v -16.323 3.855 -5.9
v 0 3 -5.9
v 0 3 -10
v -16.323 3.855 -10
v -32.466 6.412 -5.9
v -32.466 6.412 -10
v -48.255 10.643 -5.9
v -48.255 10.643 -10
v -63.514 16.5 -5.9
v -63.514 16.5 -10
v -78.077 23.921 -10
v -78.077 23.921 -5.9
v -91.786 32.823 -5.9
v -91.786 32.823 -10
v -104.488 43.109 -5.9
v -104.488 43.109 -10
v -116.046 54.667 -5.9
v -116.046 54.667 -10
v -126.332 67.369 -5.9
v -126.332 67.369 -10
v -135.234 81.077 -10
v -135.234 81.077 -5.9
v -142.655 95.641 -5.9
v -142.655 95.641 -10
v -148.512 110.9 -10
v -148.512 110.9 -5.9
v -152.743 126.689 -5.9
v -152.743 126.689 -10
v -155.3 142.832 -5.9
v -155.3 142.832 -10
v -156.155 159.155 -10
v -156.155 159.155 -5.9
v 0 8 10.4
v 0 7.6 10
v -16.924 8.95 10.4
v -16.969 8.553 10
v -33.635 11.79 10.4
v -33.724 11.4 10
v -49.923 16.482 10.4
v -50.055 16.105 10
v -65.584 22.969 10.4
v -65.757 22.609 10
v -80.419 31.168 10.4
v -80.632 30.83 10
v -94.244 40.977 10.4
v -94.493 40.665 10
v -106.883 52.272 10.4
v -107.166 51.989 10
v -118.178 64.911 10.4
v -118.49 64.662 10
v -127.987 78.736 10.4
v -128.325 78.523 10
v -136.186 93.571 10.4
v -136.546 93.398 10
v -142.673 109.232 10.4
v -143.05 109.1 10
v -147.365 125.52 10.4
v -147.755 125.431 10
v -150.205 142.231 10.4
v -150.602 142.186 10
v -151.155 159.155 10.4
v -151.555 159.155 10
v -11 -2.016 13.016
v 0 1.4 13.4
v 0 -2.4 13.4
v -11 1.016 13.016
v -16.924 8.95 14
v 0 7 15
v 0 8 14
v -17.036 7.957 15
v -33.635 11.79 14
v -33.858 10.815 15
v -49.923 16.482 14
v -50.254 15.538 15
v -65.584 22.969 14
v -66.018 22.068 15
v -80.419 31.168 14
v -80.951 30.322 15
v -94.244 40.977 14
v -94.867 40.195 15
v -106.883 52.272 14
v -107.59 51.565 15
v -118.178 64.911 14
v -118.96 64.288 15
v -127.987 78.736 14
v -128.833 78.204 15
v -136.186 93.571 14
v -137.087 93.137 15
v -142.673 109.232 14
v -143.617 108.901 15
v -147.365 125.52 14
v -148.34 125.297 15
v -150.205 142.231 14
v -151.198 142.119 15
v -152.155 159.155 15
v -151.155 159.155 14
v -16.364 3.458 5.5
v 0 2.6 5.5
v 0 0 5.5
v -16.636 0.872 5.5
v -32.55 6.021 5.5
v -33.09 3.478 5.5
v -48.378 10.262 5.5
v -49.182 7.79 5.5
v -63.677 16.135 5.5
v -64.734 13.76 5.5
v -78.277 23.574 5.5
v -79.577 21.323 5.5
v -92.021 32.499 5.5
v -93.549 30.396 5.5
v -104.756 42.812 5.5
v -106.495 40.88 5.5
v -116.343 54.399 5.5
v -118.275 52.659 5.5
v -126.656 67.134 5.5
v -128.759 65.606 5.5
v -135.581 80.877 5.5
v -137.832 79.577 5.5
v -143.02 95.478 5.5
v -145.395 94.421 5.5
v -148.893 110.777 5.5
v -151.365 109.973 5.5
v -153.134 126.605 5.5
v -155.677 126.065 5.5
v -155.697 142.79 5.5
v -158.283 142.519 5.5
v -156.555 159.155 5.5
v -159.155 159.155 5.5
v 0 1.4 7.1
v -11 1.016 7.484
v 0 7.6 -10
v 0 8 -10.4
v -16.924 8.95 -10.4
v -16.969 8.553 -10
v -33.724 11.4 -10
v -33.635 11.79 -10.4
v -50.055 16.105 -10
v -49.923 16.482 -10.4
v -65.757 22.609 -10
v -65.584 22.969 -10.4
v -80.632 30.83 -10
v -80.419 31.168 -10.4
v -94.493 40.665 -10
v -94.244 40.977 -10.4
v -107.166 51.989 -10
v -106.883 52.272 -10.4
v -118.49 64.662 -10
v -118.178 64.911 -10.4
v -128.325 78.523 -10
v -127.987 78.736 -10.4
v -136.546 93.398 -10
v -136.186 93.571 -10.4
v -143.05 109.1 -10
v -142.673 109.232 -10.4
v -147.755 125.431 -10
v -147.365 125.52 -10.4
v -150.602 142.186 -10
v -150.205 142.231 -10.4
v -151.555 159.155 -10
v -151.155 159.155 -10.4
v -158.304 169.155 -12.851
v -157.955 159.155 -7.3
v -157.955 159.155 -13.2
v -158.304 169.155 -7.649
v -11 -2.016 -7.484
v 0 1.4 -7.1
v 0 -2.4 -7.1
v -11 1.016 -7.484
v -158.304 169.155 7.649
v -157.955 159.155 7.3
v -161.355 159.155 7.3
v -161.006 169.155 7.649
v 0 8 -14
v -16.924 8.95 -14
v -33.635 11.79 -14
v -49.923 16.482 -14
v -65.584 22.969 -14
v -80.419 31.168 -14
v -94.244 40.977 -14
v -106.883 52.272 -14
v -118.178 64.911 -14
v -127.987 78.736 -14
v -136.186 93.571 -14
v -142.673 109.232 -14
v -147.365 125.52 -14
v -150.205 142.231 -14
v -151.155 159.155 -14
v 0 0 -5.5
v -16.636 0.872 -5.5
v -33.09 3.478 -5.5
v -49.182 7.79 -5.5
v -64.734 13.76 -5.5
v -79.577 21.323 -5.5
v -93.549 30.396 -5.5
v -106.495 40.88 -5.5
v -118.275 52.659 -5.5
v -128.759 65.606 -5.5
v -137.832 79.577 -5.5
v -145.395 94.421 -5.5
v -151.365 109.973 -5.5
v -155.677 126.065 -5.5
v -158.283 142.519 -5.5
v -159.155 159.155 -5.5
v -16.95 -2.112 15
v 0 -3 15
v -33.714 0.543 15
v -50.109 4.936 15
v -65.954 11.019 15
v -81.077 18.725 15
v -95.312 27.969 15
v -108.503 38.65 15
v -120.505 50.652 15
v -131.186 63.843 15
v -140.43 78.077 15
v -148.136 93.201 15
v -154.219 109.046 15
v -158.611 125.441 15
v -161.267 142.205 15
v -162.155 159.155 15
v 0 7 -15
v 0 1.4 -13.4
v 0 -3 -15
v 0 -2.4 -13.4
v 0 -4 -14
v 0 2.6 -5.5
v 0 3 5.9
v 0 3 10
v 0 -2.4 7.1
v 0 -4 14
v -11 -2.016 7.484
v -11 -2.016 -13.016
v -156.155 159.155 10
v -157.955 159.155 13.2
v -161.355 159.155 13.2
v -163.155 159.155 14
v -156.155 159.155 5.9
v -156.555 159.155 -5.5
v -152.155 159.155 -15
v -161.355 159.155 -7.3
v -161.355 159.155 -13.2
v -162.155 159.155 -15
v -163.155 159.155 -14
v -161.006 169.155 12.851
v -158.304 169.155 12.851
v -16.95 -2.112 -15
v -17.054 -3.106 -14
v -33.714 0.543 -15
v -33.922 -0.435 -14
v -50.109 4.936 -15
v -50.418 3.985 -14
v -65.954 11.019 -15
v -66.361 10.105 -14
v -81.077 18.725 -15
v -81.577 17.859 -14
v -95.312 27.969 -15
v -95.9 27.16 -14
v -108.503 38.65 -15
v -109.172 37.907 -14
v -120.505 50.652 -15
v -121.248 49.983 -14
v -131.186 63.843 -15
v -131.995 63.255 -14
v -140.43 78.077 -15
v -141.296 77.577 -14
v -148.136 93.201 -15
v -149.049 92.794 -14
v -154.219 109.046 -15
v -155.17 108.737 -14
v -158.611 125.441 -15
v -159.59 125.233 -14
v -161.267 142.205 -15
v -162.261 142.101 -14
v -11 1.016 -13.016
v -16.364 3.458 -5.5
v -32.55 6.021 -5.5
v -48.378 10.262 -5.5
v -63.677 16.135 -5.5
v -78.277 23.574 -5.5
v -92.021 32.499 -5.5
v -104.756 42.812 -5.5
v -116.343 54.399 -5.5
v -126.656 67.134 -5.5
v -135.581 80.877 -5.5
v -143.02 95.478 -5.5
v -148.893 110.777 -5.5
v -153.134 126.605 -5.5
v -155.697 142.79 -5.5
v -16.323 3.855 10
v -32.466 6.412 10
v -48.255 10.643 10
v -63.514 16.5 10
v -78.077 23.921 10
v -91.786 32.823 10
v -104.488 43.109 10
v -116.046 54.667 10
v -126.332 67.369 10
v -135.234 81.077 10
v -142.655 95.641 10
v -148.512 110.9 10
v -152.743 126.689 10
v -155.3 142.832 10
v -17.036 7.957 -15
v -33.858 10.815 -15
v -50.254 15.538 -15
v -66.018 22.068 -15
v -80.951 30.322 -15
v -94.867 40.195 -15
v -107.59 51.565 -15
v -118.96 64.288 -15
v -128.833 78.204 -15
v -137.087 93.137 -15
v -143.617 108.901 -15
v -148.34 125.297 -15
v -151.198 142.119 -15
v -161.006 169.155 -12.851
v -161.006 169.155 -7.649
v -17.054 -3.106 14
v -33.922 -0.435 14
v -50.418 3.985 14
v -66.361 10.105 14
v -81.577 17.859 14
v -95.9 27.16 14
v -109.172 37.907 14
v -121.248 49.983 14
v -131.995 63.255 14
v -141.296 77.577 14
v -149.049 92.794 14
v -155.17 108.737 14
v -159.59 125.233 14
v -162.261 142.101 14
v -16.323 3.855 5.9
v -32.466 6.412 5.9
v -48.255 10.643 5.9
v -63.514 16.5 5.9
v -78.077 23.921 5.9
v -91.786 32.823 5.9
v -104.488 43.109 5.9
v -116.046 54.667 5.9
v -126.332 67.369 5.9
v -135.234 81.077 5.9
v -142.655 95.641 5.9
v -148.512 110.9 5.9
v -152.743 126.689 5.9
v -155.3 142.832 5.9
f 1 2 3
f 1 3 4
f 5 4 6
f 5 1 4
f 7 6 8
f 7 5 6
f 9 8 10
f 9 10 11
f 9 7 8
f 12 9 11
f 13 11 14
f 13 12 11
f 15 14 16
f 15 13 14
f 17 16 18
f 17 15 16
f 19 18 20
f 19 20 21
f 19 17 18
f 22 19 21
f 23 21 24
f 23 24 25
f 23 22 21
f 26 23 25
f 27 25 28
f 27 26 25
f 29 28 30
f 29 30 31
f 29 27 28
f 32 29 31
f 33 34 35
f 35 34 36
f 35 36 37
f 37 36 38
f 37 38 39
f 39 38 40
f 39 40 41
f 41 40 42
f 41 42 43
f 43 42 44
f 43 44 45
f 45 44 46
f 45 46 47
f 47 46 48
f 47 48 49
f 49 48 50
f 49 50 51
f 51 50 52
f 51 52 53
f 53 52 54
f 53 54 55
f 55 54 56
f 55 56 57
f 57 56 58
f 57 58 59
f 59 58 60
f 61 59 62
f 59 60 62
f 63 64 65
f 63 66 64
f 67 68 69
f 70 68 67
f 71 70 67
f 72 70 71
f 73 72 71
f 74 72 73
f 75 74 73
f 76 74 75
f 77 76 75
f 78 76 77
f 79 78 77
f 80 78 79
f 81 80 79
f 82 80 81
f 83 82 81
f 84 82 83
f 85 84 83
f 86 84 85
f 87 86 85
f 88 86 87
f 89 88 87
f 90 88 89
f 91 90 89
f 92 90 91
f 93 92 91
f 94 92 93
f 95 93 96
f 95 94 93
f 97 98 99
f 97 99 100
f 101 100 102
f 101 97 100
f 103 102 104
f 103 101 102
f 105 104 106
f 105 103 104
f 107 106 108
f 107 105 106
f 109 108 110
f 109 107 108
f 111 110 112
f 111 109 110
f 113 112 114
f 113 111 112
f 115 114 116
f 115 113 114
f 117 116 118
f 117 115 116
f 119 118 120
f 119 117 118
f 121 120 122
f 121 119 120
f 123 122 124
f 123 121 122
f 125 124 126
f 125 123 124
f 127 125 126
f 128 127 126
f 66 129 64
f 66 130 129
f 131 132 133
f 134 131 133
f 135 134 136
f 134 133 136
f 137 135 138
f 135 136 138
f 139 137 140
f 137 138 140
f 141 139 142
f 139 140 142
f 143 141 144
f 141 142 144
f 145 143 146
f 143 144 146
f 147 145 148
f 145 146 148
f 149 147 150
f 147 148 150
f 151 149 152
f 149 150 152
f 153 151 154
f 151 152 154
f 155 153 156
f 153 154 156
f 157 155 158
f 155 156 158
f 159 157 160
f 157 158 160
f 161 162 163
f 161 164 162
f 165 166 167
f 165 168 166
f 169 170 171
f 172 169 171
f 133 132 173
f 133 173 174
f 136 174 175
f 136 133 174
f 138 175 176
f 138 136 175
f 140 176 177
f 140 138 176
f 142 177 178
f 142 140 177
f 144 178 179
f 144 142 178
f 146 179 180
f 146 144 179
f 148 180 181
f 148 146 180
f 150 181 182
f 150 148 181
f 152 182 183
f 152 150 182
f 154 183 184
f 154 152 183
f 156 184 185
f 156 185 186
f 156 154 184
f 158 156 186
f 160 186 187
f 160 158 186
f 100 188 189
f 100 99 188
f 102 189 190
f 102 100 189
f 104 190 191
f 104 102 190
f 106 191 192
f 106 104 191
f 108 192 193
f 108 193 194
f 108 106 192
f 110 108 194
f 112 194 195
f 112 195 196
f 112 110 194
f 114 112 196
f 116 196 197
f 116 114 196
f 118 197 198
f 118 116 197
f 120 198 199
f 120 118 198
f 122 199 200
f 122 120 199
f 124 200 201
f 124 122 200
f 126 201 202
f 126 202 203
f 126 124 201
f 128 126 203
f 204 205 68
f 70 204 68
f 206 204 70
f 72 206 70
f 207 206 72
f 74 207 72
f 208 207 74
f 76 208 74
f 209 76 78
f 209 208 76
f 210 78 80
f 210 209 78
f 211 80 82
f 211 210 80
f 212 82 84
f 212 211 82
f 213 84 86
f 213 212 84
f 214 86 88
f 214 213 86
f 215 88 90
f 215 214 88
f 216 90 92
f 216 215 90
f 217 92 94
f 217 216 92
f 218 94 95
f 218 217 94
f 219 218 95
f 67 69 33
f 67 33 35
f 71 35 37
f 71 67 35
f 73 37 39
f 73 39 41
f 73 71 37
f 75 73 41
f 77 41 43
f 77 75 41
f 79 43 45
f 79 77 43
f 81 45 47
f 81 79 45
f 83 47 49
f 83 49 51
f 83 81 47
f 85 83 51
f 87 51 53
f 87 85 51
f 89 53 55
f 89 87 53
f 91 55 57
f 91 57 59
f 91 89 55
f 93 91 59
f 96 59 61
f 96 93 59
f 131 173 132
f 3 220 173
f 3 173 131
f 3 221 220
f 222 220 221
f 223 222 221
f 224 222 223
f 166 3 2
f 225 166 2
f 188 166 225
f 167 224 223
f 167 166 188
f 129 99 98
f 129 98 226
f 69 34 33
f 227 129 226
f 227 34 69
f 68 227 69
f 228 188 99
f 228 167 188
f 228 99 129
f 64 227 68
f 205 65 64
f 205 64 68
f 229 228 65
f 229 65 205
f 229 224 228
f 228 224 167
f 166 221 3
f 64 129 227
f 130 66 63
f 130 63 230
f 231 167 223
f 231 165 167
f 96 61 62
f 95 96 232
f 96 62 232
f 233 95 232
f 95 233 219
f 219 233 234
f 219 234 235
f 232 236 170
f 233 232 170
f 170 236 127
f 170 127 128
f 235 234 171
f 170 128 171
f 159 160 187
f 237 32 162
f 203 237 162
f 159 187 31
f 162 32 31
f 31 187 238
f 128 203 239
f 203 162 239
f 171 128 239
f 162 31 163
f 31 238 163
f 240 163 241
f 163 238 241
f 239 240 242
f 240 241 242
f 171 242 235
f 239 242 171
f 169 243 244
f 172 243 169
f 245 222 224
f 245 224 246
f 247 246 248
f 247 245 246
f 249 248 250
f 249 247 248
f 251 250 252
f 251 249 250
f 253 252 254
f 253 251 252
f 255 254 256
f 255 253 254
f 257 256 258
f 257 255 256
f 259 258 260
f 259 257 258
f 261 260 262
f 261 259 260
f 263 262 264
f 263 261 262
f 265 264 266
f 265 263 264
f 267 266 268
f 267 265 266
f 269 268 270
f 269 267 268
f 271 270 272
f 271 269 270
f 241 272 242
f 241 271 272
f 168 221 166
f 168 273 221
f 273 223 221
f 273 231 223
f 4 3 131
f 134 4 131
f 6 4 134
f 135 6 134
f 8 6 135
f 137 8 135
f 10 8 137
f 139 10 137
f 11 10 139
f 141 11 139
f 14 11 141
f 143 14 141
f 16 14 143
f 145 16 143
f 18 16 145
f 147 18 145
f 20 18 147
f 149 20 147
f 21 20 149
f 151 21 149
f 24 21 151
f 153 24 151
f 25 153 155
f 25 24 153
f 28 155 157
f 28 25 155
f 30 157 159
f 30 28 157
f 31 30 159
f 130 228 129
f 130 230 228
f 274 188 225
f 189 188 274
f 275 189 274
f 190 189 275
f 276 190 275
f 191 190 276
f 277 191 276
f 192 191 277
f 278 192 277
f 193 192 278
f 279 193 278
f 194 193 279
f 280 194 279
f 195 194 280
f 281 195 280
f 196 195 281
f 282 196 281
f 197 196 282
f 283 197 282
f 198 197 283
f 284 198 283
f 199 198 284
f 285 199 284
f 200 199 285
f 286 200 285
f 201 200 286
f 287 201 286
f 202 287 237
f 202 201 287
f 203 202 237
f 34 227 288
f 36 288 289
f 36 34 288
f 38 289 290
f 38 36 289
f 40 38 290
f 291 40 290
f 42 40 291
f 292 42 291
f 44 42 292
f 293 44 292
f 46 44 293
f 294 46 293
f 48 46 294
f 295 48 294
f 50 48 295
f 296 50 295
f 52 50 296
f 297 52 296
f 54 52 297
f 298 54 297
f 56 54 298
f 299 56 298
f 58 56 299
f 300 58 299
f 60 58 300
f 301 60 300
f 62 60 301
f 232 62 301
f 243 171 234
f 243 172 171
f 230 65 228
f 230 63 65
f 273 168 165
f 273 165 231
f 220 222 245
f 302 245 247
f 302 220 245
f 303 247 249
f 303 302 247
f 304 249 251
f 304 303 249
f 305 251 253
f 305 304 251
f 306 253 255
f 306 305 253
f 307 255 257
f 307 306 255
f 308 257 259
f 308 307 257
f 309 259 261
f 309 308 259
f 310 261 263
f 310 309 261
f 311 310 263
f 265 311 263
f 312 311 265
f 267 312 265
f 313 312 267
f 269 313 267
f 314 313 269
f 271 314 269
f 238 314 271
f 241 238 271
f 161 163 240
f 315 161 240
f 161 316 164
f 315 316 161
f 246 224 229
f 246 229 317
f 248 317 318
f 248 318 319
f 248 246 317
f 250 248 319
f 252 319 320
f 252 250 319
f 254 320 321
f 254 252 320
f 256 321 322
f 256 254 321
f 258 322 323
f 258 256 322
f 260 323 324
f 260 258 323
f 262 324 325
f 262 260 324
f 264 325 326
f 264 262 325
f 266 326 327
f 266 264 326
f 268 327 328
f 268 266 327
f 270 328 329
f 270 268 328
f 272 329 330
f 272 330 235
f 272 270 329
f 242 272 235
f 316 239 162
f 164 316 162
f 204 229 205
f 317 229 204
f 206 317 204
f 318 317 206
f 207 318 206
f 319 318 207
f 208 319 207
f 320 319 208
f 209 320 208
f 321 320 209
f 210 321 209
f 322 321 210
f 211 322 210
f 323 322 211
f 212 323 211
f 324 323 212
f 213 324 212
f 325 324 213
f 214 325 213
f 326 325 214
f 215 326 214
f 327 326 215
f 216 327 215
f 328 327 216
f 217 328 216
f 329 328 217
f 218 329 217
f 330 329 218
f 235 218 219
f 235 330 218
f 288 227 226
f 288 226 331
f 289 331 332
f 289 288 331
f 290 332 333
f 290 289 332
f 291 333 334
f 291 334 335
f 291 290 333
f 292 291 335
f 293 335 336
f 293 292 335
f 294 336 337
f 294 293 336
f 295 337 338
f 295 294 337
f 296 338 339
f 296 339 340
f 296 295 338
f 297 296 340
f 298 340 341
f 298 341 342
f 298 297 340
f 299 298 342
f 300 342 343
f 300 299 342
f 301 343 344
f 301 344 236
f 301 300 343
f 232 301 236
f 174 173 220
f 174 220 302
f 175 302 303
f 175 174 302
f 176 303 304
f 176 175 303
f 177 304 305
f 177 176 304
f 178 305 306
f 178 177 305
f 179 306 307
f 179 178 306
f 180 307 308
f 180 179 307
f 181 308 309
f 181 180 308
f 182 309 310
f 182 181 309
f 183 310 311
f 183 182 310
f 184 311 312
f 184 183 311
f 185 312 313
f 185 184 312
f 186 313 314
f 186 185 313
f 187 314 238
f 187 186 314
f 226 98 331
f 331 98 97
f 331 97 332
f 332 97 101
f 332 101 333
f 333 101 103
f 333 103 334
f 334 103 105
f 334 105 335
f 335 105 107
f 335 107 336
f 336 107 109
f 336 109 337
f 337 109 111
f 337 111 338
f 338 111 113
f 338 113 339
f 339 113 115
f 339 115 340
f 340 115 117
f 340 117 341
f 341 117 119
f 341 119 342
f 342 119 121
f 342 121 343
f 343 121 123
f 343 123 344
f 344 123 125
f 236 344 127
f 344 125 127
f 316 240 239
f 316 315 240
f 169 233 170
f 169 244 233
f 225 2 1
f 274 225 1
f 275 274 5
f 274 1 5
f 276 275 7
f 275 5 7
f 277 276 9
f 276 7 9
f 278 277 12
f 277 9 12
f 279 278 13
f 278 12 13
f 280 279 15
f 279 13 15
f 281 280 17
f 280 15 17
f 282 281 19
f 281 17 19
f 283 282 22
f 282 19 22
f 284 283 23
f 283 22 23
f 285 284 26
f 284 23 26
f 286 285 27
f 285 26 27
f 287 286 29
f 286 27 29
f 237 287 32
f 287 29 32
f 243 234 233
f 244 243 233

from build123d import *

# Parameters (mm, degrees)
CHANFREIN1_SIZE         = 1
CHANFREIN3_SIZE         = 0.4
ESQUISSE5_W             = 6.3
ESQUISSE5_H             = 3.8
ENL_V_MAT_EXTRU_1_DEPTH = 11
ENL_V_MAT_EXTRU_1_TAPER = 2
ESQUISSE6_W             = 3.4
ESQUISSE6_H             = 5.9
BOSS_EXTRU_2_DEPTH      = 10
BOSS_EXTRU_2_TAPER      = 2


with BuildPart() as part:
    # Balayage1: sweep along a path in Esquisse1
    with BuildLine(Plane.XY) as balayage1_path:
        ThreePointArc((0, 0), (-112.53953952, 46.615403572), (-159.154943092, 159.154943092))
    # Esquisse2 → Balayage1 (sweep)
    with BuildSketch(Plane(origin=(0, 0, 0), x_dir=(0, 0, -1), z_dir=(1, 0, 0))):
        Polygon((-5.5, 0), (5.5, 0), (5.5, 3), (10, 3), (10, 8), (15, 8), (15, -4), (-15, -4), (-15, 8), (-10, 8), (-10, 3), (-5.5, 3), align=None)
    sweep(path=balayage1_path.line)

    # Chanfrein1
    chanfrein1_edges = [part.edges().sort_by_distance(p)[0] for p in [
        (-106.88268527, 52.272257822, 15),
        (-115.367966644, 43.786976448, 15),
        (-115.367966644, 43.786976448, -15),
        (-106.88268527, 52.272257822, -15),
    ]]
    chamfer(chanfrein1_edges, length=CHANFREIN1_SIZE)

    # Chanfrein3
    chanfrein3_edges = [part.edges().sort_by_distance(p)[0] for p in [
        (-106.88268527, 52.272257822, 10),
        (-106.88268527, 52.272257822, -10),
        (-110.418219176, 48.736723916, -5.5),
        (-110.418219176, 48.736723916, 5.5),
    ]]
    chamfer(chanfrein3_edges, length=CHANFREIN3_SIZE)

    # Esquisse5 → Enlèv. mat.-Extru.1 (cut)
    with BuildSketch(Plane(origin=(0, 0, 0), x_dir=(0, 0, -1), z_dir=(1, 0, 0))):
        with Locations((-10.25, -0.5)):
            Rectangle(ESQUISSE5_W, ESQUISSE5_H)
        with Locations((10.25, -0.5)):
            Rectangle(ESQUISSE5_W, ESQUISSE5_H)
    extrude(amount=-ENL_V_MAT_EXTRU_1_DEPTH, taper=ENL_V_MAT_EXTRU_1_TAPER, mode=Mode.SUBTRACT)

    # Esquisse6 → Boss.-Extru.2 (add)
    with BuildSketch(Plane(origin=(0, 159.154943092, 0), x_dir=(1, 0, 0), z_dir=(0, 1, 0))):
        with Locations((-159.654943092, -10.25)):
            Rectangle(ESQUISSE6_W, ESQUISSE6_H)
        with Locations((-159.654943092, 10.25)):
            Rectangle(ESQUISSE6_W, ESQUISSE6_H)
    extrude(amount=BOSS_EXTRU_2_DEPTH, taper=BOSS_EXTRU_2_TAPER)


solid = part.part
